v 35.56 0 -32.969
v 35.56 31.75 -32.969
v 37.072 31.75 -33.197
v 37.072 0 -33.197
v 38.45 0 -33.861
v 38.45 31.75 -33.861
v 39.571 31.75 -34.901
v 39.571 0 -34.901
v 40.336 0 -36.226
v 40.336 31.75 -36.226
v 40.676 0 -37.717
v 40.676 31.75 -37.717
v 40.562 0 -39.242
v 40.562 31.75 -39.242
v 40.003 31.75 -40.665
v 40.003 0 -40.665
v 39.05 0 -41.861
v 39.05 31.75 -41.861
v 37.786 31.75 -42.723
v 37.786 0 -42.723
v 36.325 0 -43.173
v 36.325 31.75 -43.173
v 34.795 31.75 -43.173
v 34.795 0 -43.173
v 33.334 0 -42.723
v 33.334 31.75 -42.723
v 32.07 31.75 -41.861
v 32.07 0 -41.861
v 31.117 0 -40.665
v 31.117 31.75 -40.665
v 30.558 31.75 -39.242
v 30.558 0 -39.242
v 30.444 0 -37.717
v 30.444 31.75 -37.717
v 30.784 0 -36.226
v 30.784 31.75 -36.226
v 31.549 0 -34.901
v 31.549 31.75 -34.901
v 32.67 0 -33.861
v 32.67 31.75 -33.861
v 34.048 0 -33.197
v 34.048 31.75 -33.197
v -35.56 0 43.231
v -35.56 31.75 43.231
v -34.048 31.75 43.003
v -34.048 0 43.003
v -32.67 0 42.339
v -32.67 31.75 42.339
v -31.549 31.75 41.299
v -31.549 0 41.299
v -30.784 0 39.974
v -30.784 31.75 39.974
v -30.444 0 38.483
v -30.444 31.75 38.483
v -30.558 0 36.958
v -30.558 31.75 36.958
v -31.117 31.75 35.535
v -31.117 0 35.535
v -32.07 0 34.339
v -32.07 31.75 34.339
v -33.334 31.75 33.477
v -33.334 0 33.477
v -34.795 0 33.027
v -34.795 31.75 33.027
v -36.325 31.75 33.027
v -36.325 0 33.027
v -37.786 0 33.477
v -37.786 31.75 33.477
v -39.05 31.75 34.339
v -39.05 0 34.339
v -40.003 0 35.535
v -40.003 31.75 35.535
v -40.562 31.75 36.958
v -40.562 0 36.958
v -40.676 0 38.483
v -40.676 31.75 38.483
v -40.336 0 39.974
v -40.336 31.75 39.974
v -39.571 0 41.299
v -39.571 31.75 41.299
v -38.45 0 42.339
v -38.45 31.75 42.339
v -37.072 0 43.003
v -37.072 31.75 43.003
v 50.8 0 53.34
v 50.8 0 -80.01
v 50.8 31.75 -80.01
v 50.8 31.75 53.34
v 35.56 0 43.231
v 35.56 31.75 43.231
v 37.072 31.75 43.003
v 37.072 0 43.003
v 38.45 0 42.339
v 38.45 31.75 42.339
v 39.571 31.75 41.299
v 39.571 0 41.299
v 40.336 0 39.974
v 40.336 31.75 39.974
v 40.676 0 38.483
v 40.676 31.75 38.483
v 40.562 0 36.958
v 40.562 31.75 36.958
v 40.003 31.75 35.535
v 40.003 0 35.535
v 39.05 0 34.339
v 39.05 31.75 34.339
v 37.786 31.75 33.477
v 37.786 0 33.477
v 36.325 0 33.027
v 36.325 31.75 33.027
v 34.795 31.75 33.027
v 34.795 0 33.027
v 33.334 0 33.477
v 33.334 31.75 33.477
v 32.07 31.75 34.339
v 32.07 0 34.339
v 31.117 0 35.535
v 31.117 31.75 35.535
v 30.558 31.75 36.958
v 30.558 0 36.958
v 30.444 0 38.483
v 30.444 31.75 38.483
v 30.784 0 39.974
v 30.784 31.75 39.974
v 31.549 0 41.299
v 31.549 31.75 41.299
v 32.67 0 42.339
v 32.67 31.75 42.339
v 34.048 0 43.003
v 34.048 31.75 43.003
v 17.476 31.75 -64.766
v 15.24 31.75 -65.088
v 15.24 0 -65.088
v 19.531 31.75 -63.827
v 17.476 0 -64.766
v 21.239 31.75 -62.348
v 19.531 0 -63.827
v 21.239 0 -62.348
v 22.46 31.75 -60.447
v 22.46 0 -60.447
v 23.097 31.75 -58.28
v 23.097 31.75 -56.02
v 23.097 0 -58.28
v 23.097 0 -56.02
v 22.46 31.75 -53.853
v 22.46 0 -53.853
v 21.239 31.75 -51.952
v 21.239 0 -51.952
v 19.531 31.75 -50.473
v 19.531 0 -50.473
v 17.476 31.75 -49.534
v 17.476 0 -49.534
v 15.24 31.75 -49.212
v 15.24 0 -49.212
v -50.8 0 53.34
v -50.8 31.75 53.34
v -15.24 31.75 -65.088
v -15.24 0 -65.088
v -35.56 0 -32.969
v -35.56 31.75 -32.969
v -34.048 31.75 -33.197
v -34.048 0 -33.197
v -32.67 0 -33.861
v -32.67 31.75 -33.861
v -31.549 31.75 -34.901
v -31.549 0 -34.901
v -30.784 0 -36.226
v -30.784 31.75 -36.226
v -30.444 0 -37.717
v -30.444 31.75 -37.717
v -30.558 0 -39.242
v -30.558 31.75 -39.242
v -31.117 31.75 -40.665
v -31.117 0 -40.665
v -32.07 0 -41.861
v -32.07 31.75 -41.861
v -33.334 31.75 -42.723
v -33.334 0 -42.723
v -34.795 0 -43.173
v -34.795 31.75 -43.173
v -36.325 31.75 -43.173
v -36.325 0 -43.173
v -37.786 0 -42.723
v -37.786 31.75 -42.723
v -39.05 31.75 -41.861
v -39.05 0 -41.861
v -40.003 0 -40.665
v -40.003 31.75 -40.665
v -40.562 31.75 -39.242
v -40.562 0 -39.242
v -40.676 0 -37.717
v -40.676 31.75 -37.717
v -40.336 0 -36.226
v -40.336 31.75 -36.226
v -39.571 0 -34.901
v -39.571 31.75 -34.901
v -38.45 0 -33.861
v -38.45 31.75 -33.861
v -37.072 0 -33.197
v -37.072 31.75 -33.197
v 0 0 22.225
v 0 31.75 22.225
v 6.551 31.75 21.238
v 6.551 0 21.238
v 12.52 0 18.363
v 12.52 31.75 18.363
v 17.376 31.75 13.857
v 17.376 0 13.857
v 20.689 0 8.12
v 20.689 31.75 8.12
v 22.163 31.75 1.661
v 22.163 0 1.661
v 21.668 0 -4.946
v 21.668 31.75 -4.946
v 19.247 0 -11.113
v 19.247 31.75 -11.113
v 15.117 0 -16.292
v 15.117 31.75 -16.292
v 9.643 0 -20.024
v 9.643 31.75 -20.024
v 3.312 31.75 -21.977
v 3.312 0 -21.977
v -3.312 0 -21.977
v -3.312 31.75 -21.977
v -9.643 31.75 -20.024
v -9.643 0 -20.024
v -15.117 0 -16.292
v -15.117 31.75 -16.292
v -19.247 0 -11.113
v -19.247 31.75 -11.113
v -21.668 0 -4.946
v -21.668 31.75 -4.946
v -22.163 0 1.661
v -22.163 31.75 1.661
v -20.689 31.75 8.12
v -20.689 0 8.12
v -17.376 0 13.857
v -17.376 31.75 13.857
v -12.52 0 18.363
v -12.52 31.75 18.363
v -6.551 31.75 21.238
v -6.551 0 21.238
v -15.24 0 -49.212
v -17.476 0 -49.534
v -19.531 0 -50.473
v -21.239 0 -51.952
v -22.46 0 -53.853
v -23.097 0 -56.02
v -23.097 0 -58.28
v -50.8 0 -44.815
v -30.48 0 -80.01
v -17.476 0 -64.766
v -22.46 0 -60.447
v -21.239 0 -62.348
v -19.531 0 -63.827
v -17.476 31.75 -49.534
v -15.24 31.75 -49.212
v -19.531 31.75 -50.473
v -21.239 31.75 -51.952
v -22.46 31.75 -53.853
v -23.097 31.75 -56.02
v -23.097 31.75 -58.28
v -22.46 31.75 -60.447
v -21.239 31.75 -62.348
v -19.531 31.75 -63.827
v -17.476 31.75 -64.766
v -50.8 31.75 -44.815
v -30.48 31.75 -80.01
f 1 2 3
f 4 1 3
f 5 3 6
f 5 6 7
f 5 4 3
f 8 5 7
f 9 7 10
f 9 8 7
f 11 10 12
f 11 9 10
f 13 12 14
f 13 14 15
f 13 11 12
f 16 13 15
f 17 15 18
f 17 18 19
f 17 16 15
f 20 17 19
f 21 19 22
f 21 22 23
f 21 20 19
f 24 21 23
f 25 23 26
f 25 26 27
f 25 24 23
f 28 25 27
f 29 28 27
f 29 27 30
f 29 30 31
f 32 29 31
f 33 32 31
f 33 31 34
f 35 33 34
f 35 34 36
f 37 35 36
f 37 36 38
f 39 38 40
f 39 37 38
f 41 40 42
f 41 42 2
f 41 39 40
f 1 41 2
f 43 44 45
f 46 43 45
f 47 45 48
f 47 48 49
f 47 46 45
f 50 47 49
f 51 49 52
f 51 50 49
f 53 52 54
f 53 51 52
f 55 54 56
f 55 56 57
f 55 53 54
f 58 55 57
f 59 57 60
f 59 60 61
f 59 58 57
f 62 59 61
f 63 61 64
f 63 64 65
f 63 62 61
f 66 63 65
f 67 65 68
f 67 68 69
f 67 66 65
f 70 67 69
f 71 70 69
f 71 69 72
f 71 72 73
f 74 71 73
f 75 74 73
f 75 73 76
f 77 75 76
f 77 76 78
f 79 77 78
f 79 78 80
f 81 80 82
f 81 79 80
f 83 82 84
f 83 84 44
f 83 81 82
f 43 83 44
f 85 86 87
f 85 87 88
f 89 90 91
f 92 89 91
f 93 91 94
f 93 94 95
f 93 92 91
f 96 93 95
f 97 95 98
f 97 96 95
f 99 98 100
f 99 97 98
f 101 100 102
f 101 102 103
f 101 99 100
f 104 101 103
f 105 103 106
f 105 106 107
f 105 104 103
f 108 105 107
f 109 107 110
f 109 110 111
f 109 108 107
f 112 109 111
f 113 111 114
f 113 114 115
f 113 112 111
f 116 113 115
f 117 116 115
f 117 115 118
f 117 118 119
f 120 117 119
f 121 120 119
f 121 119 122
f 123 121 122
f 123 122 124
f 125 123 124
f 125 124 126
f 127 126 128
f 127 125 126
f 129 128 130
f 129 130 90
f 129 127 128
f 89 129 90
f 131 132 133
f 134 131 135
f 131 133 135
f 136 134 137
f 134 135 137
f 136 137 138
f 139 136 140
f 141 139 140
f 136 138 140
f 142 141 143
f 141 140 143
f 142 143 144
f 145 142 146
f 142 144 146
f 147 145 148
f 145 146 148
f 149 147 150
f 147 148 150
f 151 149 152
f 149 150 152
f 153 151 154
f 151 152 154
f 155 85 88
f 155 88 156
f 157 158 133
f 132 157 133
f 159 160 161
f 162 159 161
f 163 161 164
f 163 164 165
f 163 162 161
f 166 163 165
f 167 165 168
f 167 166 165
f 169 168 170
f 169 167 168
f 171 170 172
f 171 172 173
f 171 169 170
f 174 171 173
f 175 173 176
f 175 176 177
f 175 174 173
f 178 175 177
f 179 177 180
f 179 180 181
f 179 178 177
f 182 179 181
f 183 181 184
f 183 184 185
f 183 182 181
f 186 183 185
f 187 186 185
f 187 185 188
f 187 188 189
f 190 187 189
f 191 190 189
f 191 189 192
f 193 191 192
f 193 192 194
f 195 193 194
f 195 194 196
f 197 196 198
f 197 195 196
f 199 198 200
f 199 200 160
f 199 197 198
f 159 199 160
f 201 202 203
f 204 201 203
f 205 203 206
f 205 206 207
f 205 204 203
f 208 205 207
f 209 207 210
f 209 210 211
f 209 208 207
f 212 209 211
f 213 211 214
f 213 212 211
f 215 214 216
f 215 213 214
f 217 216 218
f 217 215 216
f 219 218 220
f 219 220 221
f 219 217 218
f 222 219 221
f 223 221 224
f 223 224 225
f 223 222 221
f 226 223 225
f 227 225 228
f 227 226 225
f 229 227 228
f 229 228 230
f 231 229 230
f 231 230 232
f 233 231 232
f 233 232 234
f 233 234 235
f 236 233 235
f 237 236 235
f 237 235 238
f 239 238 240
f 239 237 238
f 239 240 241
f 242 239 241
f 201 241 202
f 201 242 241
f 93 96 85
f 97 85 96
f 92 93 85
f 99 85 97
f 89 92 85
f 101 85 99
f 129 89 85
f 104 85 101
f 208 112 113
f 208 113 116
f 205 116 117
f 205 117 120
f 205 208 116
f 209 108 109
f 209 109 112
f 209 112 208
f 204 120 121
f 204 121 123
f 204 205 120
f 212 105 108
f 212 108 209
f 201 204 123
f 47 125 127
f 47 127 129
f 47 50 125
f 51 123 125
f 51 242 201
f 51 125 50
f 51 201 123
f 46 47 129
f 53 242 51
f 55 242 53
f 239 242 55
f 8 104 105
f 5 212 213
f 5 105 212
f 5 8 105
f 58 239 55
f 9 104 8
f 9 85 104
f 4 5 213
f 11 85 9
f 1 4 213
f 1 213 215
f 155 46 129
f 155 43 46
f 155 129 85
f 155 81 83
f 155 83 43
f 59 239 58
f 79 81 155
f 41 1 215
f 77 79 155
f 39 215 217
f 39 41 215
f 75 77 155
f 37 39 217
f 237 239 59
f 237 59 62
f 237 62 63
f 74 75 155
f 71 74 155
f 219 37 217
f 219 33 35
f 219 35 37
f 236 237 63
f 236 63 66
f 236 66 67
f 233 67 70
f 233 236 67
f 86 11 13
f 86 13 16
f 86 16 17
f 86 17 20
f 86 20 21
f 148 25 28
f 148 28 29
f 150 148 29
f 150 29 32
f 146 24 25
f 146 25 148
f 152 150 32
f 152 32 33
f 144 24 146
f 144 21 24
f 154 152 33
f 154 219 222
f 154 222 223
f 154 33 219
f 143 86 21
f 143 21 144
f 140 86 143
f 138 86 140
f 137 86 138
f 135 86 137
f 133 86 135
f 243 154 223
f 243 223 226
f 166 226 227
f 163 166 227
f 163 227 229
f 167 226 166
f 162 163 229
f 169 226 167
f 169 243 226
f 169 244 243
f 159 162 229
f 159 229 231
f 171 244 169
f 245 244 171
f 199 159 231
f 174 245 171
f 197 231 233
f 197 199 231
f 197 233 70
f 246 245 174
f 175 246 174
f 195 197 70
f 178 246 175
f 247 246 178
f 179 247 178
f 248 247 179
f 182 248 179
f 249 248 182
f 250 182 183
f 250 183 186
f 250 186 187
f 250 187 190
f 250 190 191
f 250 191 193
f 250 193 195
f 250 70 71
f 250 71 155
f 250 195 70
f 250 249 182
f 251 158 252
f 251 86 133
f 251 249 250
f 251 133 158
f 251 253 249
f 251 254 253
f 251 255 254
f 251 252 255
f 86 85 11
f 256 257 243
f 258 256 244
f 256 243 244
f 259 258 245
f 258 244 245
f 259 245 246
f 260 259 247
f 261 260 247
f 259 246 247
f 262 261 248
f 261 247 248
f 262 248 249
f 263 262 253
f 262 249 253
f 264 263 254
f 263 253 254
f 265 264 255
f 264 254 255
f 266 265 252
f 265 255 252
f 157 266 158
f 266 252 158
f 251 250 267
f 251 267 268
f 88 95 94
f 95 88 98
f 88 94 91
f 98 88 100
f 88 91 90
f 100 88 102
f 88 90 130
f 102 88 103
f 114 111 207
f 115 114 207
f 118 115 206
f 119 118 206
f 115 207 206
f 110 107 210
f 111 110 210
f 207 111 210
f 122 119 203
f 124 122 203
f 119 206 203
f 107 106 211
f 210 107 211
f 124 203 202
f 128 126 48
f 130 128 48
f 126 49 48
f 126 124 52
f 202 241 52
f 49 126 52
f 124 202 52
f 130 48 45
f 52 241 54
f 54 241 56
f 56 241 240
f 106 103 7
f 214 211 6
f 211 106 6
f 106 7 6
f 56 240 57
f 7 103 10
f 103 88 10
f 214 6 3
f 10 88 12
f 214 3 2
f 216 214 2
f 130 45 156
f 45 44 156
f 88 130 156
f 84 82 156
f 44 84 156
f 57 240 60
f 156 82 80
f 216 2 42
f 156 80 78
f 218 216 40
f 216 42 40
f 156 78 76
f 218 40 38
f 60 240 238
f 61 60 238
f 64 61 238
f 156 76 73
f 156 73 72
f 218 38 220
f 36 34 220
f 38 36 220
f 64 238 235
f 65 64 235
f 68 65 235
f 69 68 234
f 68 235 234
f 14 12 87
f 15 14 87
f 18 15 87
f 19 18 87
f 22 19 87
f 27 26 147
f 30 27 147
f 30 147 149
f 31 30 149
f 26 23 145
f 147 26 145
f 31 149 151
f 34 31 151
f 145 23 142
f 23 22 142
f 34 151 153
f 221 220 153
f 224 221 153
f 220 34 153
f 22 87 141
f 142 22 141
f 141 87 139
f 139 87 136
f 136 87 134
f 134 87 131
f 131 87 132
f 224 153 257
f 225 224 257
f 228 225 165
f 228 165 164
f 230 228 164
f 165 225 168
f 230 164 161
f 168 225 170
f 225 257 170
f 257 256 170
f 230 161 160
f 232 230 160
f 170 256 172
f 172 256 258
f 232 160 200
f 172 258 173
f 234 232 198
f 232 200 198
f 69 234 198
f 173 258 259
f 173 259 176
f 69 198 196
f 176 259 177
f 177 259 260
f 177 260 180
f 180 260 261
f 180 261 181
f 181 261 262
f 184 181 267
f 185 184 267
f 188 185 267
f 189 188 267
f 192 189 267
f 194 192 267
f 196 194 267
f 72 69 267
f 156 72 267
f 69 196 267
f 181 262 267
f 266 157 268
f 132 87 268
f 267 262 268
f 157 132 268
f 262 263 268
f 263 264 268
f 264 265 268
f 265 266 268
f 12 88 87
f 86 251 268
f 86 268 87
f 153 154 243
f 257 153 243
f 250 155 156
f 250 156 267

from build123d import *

# Parameters (mm, degrees)
SKETCH1_R           = 22.225
SKETCH1_R_2         = 5.1308
BOSS_EXTRUDE1_DEPTH = 31.75


with BuildPart() as part:
    # Sketch1 → Boss-Extrude1 (new body)
    with BuildSketch(Plane(origin=(0, 0, 0), x_dir=(1, 0, 0), z_dir=(0, 1, 0))):
        Polygon((-30.48, 80.01), (50.8, 80.01), (50.8, -53.34), (-50.8, -53.34), (-50.8, 44.81472759), align=None)
        with Locations(Location((0, 0, 0), (0, 0, 270))):
            Circle(SKETCH1_R, mode=Mode.SUBTRACT)
        with Locations(Location((35.56, 38.1, 0), (0, 0, 270))):
            Circle(SKETCH1_R_2, mode=Mode.SUBTRACT)
        with Locations(Location((-35.56, 38.1, 0), (0, 0, 270))):
            Circle(SKETCH1_R_2, mode=Mode.SUBTRACT)
        with Locations(Location((-35.56, -38.1, 0), (0, 0, 270))):
            Circle(SKETCH1_R_2, mode=Mode.SUBTRACT)
        with Locations(Location((35.56, -38.1, 0), (0, 0, 270))):
            Circle(SKETCH1_R_2, mode=Mode.SUBTRACT)
        with BuildLine():
            Line((-15.24, 65.0875), (15.24, 65.0875))
            ThreePointArc((15.24, 65.0875), (23.1775, 57.15), (15.24, 49.2125))
            Line((15.24, 49.2125), (-15.24, 49.2125))
            ThreePointArc((-15.24, 49.2125), (-23.1775, 57.15), (-15.24, 65.0875))
        make_face(mode=Mode.SUBTRACT)
    extrude(amount=BOSS_EXTRUDE1_DEPTH)


solid = part.part
